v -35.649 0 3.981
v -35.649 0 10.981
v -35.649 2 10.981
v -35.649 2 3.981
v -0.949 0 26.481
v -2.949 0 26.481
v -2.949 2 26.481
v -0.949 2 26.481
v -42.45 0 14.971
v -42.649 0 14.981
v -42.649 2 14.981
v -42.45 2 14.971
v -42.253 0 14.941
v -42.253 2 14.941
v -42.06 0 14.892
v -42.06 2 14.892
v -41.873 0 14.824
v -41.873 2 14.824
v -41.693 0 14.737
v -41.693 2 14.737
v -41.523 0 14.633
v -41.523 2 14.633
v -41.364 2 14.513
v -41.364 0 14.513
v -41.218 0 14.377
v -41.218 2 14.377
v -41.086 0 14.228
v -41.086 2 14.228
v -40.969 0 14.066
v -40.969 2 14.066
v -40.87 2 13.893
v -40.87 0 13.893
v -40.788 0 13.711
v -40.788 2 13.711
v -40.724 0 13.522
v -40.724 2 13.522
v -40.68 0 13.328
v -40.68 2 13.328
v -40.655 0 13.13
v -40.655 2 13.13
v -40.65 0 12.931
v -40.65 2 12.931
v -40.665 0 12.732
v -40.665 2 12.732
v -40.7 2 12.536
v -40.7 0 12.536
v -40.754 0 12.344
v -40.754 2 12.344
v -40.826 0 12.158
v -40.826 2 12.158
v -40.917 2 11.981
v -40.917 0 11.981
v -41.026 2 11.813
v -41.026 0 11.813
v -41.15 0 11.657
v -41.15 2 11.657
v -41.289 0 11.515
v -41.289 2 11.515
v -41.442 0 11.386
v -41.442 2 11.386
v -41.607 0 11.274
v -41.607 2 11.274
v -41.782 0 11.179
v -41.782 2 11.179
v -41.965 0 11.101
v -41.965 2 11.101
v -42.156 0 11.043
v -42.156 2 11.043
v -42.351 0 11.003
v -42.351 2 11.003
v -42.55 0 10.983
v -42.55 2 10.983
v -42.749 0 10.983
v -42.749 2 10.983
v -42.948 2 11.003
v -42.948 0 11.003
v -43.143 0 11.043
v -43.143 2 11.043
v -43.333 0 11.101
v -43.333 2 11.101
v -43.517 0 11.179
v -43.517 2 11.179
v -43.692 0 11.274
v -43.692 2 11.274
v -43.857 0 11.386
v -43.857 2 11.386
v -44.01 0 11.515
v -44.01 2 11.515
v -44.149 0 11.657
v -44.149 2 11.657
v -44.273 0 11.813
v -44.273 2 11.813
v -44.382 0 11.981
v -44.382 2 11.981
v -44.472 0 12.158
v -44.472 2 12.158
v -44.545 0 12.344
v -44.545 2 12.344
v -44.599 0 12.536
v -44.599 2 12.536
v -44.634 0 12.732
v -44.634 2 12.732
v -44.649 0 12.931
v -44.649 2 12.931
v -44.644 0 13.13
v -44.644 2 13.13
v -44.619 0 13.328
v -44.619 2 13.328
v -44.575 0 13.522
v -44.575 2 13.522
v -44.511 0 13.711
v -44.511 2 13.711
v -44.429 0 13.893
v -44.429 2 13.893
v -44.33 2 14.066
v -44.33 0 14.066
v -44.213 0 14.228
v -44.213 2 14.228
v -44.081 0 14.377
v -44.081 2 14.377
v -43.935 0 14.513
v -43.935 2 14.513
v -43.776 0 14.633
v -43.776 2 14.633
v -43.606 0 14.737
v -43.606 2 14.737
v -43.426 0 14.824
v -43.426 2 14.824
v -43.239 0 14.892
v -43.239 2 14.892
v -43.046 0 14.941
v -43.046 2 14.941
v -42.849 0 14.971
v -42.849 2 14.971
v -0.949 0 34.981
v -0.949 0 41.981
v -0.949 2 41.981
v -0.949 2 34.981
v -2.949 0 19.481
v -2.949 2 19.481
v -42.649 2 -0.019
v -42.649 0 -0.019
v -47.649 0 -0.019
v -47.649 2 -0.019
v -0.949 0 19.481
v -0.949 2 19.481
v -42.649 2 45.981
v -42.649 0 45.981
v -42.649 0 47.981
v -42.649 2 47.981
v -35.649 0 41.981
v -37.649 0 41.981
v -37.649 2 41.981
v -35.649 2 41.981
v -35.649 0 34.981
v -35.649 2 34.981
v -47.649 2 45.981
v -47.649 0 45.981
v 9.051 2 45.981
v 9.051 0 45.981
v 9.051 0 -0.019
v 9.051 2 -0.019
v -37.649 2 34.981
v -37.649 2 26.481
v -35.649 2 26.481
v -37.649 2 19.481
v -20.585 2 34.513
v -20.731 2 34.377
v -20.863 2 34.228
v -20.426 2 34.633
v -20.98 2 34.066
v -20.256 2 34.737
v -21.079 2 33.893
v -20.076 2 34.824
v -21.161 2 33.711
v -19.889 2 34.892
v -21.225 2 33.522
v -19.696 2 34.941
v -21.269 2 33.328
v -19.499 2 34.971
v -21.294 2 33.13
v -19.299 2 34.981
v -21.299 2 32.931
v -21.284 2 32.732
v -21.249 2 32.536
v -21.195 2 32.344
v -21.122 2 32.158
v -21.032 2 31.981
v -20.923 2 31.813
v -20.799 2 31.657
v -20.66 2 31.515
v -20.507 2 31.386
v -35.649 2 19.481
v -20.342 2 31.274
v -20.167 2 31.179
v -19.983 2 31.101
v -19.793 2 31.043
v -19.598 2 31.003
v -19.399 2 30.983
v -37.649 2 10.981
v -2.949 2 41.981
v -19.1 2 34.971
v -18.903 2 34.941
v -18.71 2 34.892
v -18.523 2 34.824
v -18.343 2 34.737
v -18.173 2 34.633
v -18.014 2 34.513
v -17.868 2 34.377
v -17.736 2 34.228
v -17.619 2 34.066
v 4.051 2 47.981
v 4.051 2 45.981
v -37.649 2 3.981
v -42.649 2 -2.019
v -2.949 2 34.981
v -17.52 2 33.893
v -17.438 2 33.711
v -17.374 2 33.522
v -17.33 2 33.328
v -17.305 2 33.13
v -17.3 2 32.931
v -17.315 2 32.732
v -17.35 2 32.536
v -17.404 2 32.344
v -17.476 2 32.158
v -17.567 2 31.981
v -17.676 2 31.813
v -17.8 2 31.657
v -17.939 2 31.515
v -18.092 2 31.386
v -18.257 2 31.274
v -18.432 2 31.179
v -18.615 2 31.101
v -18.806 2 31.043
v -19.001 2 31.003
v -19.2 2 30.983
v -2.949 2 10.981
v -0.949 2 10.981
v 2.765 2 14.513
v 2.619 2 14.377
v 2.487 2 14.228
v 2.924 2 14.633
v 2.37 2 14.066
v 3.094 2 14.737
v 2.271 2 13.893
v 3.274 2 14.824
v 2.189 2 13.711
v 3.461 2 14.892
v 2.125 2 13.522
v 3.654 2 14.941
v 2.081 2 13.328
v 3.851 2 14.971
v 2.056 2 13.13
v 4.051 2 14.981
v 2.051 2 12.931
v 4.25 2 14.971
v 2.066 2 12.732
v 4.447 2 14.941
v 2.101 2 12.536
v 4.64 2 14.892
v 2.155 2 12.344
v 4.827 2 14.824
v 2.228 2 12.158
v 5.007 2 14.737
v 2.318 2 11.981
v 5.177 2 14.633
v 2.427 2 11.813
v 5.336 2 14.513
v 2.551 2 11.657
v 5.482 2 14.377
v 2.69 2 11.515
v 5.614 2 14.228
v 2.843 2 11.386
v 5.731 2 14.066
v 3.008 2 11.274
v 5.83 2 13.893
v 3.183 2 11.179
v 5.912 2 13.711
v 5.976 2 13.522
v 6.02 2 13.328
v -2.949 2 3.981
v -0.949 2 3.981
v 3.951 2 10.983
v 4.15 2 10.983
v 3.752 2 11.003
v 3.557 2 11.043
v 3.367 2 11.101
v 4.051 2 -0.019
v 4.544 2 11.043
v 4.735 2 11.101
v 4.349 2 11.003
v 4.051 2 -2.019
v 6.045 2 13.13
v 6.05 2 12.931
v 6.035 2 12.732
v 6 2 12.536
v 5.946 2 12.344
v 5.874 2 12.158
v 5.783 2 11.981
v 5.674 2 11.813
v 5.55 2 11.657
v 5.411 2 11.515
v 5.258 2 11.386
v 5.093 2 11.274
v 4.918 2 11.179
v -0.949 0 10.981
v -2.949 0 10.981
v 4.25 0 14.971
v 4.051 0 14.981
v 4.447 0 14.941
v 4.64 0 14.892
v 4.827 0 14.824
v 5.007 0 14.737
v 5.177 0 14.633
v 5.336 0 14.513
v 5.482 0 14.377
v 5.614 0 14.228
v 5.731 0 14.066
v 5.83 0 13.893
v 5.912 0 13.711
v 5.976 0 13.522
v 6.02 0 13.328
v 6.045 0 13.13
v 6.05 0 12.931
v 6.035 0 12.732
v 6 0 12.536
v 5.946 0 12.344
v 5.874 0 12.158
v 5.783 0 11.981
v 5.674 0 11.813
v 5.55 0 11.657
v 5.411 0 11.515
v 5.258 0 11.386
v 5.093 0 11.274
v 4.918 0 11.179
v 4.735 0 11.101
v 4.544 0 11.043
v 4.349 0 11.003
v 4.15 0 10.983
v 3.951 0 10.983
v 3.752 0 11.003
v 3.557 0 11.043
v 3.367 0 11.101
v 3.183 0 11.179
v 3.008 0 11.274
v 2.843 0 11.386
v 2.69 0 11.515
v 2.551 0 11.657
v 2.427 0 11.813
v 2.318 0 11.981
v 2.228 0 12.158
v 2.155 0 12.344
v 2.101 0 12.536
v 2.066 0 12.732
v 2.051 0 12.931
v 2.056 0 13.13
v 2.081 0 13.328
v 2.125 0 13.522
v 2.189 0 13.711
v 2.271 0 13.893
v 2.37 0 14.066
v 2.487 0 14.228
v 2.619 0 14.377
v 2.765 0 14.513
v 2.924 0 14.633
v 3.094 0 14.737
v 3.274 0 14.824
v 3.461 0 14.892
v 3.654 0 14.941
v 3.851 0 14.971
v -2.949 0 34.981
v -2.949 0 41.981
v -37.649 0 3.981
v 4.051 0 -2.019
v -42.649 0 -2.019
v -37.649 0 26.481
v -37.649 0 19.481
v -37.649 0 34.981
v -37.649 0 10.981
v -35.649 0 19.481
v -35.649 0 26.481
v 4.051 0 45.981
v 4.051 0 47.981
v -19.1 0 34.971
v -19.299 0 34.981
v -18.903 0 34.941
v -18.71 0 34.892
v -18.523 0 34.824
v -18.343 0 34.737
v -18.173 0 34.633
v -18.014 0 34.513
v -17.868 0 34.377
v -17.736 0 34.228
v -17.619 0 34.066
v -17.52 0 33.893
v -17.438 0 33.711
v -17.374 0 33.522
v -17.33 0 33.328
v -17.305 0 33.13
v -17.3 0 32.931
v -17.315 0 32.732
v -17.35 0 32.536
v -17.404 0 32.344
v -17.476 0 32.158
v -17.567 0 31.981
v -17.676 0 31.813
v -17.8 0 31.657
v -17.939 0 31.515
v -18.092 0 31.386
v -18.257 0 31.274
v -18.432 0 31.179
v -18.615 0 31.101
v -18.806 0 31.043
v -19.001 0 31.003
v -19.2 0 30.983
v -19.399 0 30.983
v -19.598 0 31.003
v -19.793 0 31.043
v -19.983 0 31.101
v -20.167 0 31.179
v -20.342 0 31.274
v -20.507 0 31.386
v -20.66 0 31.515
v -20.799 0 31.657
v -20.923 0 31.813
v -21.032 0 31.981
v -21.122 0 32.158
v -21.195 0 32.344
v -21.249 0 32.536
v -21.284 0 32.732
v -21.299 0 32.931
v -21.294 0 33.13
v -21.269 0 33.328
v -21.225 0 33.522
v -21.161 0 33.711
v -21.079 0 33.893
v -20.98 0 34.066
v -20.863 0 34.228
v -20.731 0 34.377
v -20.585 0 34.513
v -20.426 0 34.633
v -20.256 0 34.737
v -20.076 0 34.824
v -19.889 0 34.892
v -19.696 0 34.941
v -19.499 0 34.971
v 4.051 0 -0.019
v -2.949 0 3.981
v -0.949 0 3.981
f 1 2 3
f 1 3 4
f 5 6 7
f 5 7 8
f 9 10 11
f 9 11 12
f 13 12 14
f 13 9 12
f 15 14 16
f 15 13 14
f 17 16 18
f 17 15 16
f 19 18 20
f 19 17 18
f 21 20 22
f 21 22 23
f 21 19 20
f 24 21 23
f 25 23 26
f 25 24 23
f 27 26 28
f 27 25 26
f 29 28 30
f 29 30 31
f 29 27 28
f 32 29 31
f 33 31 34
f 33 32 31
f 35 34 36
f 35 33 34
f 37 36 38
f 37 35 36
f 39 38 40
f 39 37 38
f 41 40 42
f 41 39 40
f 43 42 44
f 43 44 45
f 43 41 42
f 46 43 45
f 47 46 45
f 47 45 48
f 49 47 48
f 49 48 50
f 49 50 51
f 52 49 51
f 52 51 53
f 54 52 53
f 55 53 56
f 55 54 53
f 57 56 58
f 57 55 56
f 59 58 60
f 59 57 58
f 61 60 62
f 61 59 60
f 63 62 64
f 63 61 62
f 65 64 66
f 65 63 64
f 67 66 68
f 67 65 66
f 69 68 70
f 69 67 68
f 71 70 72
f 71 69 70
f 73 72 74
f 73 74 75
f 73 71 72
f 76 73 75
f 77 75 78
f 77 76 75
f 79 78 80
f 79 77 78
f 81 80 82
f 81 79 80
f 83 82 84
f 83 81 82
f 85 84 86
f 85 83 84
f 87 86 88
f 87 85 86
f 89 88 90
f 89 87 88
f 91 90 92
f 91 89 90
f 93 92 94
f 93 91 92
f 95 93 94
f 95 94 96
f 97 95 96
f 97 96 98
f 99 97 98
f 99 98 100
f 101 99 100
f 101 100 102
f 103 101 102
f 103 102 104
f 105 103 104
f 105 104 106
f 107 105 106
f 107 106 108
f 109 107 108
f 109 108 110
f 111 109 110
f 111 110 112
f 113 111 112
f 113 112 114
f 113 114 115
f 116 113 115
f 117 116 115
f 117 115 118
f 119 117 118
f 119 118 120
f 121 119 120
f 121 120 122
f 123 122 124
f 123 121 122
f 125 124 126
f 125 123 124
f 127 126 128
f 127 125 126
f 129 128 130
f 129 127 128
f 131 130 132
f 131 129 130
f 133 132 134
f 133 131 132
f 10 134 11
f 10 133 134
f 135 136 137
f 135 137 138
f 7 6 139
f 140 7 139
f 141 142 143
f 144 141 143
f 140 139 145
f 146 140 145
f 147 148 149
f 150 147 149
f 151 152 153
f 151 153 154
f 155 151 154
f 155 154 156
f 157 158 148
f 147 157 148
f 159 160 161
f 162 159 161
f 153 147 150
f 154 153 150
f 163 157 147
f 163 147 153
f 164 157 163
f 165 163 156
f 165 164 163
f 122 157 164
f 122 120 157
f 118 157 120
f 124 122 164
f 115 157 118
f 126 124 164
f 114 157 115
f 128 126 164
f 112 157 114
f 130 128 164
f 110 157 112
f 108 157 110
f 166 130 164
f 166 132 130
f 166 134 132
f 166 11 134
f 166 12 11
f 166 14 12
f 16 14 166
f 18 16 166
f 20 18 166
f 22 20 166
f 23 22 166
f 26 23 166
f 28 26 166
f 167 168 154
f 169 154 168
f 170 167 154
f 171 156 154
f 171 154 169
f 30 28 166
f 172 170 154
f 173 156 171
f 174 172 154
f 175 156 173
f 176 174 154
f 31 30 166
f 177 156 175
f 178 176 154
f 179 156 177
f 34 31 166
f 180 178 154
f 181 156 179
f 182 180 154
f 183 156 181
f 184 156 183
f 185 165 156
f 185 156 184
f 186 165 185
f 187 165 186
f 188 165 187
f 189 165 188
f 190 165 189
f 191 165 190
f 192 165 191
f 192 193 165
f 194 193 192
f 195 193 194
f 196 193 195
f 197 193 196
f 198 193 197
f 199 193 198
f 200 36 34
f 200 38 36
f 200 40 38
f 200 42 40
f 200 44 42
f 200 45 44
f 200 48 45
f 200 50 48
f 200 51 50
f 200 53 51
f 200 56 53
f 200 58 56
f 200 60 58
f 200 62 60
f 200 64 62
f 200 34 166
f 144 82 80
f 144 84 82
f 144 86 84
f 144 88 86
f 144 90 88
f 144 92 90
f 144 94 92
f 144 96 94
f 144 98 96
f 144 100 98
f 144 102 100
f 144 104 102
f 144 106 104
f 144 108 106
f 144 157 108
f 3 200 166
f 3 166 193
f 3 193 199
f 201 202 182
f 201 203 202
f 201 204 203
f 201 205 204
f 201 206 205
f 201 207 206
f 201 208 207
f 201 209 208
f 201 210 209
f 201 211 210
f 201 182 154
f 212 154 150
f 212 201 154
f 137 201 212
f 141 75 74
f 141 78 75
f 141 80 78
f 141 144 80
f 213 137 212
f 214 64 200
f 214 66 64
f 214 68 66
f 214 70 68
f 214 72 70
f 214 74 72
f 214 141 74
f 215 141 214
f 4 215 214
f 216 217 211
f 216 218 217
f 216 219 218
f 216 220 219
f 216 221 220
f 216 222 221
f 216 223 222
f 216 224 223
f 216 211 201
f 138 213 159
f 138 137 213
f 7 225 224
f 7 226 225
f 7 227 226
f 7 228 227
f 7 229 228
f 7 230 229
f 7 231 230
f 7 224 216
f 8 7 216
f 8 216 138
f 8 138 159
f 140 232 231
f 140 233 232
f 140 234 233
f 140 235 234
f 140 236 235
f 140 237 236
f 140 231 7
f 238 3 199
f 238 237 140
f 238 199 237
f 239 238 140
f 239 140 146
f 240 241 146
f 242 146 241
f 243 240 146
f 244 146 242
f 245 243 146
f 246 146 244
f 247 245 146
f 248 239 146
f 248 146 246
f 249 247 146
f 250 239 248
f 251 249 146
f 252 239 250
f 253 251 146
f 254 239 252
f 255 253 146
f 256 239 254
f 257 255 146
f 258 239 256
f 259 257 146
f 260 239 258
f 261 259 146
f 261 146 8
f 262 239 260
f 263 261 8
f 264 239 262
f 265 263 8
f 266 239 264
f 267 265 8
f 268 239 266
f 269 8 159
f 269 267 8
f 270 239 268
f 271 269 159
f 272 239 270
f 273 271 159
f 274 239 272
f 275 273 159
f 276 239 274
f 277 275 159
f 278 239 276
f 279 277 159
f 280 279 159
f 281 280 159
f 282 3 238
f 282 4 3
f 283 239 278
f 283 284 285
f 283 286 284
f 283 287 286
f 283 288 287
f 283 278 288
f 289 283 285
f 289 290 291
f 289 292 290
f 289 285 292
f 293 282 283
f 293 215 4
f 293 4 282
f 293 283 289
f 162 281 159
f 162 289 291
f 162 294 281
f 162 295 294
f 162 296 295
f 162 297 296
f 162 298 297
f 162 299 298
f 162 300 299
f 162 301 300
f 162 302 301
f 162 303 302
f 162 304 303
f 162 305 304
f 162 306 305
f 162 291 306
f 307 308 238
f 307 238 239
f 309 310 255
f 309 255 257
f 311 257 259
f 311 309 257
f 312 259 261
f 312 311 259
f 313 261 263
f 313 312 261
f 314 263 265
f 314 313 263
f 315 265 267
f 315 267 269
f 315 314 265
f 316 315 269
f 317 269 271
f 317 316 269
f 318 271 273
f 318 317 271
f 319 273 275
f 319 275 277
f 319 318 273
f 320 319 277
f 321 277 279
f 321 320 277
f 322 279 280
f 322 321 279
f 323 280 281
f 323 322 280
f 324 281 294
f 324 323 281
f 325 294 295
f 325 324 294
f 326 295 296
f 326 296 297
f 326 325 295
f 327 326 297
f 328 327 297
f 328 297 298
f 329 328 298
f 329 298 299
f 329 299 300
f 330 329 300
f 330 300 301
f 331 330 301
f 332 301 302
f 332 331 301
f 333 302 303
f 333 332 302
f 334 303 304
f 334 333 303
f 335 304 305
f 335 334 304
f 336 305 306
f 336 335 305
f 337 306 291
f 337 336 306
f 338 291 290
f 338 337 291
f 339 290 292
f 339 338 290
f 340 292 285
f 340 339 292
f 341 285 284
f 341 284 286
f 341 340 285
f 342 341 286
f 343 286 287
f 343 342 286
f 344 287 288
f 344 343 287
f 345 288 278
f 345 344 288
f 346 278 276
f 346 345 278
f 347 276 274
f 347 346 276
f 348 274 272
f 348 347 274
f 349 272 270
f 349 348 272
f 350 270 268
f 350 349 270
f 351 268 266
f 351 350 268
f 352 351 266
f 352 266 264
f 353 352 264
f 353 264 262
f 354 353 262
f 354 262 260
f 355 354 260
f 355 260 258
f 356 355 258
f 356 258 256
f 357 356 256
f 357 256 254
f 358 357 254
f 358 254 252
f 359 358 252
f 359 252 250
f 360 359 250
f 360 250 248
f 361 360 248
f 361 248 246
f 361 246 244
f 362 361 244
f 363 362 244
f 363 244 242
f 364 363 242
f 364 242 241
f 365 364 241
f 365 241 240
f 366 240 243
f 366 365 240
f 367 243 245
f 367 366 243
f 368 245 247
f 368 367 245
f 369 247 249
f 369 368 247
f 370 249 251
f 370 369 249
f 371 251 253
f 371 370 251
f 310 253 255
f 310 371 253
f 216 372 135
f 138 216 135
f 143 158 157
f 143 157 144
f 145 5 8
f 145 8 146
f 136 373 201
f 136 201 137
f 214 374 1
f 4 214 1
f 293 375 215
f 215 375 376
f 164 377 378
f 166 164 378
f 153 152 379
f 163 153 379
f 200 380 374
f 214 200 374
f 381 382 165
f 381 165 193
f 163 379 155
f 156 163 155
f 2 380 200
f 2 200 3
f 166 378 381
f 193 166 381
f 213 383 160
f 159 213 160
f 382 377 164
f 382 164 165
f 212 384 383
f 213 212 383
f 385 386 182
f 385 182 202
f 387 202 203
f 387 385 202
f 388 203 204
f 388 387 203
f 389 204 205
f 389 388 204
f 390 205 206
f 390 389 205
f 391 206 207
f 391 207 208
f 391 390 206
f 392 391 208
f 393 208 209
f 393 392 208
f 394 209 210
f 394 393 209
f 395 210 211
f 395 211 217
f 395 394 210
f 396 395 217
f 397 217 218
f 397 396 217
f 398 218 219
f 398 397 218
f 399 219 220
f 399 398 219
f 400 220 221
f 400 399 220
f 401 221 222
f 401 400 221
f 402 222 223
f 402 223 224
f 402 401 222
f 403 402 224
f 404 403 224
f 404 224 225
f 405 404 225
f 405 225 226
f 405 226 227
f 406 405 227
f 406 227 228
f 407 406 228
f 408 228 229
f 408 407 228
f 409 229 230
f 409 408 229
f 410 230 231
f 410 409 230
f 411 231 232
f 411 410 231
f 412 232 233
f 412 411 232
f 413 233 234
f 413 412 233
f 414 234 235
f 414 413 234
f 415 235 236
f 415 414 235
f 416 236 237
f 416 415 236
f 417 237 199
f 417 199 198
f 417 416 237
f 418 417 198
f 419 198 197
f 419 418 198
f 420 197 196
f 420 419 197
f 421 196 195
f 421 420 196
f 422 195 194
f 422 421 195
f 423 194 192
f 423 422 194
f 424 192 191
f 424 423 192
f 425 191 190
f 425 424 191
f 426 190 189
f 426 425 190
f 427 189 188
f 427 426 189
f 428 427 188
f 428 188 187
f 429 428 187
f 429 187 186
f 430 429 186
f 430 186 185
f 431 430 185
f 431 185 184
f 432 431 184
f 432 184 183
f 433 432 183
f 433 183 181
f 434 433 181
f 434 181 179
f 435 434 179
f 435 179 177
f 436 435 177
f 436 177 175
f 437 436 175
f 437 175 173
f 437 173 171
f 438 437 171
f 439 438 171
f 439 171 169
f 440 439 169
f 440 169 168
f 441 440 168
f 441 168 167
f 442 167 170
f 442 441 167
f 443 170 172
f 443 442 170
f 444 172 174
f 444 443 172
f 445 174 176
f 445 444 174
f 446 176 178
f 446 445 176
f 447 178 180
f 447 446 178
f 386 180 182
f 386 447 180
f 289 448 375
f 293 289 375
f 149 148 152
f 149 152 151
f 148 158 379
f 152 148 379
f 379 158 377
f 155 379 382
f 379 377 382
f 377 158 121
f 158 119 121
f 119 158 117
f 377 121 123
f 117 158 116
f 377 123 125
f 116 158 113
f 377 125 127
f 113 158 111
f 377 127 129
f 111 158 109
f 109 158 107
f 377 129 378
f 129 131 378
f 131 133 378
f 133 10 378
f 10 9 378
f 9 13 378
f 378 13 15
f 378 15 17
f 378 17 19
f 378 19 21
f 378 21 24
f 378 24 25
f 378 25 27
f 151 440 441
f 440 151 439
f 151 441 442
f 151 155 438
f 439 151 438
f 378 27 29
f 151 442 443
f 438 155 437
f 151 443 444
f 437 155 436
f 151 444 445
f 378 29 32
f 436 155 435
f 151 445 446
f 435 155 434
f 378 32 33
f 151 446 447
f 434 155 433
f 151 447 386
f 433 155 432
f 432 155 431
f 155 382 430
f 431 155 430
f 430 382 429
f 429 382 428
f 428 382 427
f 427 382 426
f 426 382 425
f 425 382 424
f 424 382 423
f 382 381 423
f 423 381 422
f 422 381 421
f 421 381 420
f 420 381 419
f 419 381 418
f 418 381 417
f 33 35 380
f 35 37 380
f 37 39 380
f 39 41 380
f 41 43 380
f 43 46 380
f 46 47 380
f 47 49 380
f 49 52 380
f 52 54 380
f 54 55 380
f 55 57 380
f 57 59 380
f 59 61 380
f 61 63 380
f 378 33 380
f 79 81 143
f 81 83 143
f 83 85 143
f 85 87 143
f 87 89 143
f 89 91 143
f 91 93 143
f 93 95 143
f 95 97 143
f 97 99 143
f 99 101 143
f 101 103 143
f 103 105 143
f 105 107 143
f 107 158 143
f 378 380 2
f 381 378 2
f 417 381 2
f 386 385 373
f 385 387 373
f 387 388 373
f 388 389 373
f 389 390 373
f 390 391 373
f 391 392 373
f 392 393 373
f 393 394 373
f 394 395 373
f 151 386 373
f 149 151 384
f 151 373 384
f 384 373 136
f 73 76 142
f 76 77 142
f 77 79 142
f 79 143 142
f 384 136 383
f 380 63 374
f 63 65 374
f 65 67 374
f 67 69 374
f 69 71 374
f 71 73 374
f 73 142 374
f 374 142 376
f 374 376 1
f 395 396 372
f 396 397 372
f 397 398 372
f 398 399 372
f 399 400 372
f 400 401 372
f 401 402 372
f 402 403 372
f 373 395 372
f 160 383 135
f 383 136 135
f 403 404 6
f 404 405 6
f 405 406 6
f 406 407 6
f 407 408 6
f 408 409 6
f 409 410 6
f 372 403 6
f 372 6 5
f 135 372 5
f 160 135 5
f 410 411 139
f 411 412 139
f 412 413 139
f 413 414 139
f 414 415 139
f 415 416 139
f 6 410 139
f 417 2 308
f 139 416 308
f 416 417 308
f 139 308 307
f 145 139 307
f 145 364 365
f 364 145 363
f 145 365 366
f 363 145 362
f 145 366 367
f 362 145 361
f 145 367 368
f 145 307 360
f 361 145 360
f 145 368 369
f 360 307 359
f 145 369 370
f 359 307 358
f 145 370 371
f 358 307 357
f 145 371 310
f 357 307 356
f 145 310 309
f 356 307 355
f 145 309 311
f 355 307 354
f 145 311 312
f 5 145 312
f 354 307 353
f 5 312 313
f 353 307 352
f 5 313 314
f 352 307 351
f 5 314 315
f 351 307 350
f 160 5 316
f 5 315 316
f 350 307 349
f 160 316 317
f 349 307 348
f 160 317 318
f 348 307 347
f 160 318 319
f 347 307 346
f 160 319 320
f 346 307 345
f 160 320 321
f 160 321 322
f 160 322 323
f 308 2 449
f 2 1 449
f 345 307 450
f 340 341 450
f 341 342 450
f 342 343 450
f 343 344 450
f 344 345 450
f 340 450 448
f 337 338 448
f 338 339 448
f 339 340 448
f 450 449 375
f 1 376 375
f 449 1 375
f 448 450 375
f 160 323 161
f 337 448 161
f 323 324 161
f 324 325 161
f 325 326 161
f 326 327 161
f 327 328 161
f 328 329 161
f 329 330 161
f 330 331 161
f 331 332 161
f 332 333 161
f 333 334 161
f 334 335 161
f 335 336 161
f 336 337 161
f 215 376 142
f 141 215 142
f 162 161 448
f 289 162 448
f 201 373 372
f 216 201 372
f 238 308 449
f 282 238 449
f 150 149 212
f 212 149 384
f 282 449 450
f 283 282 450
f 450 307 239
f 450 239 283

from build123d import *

# Parameters (mm, degrees)
SKETCH1_W           = 2
SKETCH1_H           = 7
SKETCH1_R           = 2
BOSS_EXTRUDE1_DEPTH = 2
SKETCH2_W           = 23.15
SKETCH2_H           = 50
CUT_EXTRUDE1_DEPTH  = 10


with BuildPart() as part:
    # Sketch1 → Boss-Extrude1 (new body)
    with BuildSketch(Plane(origin=(0, 0, 0), x_dir=(1, 0, 0), z_dir=(0, 1, 0))):
        Polygon((-47.649453113, 2.019339096), (-70.799453113, 2.019339096), (-70.799453113, -47.980660904), (-47.649453113, -47.980660904), (-47.649453113, -45.980660904), (-42.649453113, -45.980660904), (-42.649453113, -47.980660904), (4.050546887, -47.980660904), (4.050546887, -45.980660904), (9.050546887, -45.980660904), (9.050546887, -47.980660904), (32.200546887, -47.980660904), (32.200546887, 2.019339096), (9.050546887, 2.019339096), (9.050546887, 0.019339096), (4.050546887, 0.019339096), (4.050546887, 2.019339096), (-42.649453113, 2.019339096), (-42.649453113, 0.019339096), (-47.649453113, 0.019339096), align=None)
        with Locations((-36.649453113, -38.480660904)):
            Rectangle(SKETCH1_W, SKETCH1_H, mode=Mode.SUBTRACT)
        with Locations((-1.949453113, -38.480660904)):
            Rectangle(SKETCH1_W, SKETCH1_H, mode=Mode.SUBTRACT)
        with Locations(Location((-19.299453113, -32.980660904, 0), (0, 0, 270))):
            Circle(SKETCH1_R, mode=Mode.SUBTRACT)
        with Locations((-36.649453113, -22.980660904)):
            Rectangle(SKETCH1_W, SKETCH1_H, mode=Mode.SUBTRACT)
        with Locations(Location((-42.649453113, -12.980660904, 0), (0, 0, 270))):
            Circle(SKETCH1_R, mode=Mode.SUBTRACT)
        with Locations((-36.649453113, -7.480660904)):
            Rectangle(SKETCH1_W, SKETCH1_H, mode=Mode.SUBTRACT)
        with Locations((-1.949453113, -22.980660904)):
            Rectangle(SKETCH1_W, SKETCH1_H, mode=Mode.SUBTRACT)
        with Locations(Location((4.050546887, -12.980660904, 0), (0, 0, 270))):
            Circle(SKETCH1_R, mode=Mode.SUBTRACT)
        with Locations((-1.949453113, -7.480660904)):
            Rectangle(SKETCH1_W, SKETCH1_H, mode=Mode.SUBTRACT)
    extrude(amount=BOSS_EXTRUDE1_DEPTH)

    # Sketch2 → Cut-Extrude1 (cut)
    with BuildSketch(Plane(origin=(0, 0, 0), x_dir=(-1, 0, 0), z_dir=(0, -1, 0))):
        with Locations((59.224453113, -22.980660904)):
            Rectangle(SKETCH2_W, SKETCH2_H)
        with Locations((-20.625546887, -22.980660904)):
            Rectangle(SKETCH2_W, SKETCH2_H)
    extrude(amount=-CUT_EXTRUDE1_DEPTH, mode=Mode.SUBTRACT)


solid = part.part
